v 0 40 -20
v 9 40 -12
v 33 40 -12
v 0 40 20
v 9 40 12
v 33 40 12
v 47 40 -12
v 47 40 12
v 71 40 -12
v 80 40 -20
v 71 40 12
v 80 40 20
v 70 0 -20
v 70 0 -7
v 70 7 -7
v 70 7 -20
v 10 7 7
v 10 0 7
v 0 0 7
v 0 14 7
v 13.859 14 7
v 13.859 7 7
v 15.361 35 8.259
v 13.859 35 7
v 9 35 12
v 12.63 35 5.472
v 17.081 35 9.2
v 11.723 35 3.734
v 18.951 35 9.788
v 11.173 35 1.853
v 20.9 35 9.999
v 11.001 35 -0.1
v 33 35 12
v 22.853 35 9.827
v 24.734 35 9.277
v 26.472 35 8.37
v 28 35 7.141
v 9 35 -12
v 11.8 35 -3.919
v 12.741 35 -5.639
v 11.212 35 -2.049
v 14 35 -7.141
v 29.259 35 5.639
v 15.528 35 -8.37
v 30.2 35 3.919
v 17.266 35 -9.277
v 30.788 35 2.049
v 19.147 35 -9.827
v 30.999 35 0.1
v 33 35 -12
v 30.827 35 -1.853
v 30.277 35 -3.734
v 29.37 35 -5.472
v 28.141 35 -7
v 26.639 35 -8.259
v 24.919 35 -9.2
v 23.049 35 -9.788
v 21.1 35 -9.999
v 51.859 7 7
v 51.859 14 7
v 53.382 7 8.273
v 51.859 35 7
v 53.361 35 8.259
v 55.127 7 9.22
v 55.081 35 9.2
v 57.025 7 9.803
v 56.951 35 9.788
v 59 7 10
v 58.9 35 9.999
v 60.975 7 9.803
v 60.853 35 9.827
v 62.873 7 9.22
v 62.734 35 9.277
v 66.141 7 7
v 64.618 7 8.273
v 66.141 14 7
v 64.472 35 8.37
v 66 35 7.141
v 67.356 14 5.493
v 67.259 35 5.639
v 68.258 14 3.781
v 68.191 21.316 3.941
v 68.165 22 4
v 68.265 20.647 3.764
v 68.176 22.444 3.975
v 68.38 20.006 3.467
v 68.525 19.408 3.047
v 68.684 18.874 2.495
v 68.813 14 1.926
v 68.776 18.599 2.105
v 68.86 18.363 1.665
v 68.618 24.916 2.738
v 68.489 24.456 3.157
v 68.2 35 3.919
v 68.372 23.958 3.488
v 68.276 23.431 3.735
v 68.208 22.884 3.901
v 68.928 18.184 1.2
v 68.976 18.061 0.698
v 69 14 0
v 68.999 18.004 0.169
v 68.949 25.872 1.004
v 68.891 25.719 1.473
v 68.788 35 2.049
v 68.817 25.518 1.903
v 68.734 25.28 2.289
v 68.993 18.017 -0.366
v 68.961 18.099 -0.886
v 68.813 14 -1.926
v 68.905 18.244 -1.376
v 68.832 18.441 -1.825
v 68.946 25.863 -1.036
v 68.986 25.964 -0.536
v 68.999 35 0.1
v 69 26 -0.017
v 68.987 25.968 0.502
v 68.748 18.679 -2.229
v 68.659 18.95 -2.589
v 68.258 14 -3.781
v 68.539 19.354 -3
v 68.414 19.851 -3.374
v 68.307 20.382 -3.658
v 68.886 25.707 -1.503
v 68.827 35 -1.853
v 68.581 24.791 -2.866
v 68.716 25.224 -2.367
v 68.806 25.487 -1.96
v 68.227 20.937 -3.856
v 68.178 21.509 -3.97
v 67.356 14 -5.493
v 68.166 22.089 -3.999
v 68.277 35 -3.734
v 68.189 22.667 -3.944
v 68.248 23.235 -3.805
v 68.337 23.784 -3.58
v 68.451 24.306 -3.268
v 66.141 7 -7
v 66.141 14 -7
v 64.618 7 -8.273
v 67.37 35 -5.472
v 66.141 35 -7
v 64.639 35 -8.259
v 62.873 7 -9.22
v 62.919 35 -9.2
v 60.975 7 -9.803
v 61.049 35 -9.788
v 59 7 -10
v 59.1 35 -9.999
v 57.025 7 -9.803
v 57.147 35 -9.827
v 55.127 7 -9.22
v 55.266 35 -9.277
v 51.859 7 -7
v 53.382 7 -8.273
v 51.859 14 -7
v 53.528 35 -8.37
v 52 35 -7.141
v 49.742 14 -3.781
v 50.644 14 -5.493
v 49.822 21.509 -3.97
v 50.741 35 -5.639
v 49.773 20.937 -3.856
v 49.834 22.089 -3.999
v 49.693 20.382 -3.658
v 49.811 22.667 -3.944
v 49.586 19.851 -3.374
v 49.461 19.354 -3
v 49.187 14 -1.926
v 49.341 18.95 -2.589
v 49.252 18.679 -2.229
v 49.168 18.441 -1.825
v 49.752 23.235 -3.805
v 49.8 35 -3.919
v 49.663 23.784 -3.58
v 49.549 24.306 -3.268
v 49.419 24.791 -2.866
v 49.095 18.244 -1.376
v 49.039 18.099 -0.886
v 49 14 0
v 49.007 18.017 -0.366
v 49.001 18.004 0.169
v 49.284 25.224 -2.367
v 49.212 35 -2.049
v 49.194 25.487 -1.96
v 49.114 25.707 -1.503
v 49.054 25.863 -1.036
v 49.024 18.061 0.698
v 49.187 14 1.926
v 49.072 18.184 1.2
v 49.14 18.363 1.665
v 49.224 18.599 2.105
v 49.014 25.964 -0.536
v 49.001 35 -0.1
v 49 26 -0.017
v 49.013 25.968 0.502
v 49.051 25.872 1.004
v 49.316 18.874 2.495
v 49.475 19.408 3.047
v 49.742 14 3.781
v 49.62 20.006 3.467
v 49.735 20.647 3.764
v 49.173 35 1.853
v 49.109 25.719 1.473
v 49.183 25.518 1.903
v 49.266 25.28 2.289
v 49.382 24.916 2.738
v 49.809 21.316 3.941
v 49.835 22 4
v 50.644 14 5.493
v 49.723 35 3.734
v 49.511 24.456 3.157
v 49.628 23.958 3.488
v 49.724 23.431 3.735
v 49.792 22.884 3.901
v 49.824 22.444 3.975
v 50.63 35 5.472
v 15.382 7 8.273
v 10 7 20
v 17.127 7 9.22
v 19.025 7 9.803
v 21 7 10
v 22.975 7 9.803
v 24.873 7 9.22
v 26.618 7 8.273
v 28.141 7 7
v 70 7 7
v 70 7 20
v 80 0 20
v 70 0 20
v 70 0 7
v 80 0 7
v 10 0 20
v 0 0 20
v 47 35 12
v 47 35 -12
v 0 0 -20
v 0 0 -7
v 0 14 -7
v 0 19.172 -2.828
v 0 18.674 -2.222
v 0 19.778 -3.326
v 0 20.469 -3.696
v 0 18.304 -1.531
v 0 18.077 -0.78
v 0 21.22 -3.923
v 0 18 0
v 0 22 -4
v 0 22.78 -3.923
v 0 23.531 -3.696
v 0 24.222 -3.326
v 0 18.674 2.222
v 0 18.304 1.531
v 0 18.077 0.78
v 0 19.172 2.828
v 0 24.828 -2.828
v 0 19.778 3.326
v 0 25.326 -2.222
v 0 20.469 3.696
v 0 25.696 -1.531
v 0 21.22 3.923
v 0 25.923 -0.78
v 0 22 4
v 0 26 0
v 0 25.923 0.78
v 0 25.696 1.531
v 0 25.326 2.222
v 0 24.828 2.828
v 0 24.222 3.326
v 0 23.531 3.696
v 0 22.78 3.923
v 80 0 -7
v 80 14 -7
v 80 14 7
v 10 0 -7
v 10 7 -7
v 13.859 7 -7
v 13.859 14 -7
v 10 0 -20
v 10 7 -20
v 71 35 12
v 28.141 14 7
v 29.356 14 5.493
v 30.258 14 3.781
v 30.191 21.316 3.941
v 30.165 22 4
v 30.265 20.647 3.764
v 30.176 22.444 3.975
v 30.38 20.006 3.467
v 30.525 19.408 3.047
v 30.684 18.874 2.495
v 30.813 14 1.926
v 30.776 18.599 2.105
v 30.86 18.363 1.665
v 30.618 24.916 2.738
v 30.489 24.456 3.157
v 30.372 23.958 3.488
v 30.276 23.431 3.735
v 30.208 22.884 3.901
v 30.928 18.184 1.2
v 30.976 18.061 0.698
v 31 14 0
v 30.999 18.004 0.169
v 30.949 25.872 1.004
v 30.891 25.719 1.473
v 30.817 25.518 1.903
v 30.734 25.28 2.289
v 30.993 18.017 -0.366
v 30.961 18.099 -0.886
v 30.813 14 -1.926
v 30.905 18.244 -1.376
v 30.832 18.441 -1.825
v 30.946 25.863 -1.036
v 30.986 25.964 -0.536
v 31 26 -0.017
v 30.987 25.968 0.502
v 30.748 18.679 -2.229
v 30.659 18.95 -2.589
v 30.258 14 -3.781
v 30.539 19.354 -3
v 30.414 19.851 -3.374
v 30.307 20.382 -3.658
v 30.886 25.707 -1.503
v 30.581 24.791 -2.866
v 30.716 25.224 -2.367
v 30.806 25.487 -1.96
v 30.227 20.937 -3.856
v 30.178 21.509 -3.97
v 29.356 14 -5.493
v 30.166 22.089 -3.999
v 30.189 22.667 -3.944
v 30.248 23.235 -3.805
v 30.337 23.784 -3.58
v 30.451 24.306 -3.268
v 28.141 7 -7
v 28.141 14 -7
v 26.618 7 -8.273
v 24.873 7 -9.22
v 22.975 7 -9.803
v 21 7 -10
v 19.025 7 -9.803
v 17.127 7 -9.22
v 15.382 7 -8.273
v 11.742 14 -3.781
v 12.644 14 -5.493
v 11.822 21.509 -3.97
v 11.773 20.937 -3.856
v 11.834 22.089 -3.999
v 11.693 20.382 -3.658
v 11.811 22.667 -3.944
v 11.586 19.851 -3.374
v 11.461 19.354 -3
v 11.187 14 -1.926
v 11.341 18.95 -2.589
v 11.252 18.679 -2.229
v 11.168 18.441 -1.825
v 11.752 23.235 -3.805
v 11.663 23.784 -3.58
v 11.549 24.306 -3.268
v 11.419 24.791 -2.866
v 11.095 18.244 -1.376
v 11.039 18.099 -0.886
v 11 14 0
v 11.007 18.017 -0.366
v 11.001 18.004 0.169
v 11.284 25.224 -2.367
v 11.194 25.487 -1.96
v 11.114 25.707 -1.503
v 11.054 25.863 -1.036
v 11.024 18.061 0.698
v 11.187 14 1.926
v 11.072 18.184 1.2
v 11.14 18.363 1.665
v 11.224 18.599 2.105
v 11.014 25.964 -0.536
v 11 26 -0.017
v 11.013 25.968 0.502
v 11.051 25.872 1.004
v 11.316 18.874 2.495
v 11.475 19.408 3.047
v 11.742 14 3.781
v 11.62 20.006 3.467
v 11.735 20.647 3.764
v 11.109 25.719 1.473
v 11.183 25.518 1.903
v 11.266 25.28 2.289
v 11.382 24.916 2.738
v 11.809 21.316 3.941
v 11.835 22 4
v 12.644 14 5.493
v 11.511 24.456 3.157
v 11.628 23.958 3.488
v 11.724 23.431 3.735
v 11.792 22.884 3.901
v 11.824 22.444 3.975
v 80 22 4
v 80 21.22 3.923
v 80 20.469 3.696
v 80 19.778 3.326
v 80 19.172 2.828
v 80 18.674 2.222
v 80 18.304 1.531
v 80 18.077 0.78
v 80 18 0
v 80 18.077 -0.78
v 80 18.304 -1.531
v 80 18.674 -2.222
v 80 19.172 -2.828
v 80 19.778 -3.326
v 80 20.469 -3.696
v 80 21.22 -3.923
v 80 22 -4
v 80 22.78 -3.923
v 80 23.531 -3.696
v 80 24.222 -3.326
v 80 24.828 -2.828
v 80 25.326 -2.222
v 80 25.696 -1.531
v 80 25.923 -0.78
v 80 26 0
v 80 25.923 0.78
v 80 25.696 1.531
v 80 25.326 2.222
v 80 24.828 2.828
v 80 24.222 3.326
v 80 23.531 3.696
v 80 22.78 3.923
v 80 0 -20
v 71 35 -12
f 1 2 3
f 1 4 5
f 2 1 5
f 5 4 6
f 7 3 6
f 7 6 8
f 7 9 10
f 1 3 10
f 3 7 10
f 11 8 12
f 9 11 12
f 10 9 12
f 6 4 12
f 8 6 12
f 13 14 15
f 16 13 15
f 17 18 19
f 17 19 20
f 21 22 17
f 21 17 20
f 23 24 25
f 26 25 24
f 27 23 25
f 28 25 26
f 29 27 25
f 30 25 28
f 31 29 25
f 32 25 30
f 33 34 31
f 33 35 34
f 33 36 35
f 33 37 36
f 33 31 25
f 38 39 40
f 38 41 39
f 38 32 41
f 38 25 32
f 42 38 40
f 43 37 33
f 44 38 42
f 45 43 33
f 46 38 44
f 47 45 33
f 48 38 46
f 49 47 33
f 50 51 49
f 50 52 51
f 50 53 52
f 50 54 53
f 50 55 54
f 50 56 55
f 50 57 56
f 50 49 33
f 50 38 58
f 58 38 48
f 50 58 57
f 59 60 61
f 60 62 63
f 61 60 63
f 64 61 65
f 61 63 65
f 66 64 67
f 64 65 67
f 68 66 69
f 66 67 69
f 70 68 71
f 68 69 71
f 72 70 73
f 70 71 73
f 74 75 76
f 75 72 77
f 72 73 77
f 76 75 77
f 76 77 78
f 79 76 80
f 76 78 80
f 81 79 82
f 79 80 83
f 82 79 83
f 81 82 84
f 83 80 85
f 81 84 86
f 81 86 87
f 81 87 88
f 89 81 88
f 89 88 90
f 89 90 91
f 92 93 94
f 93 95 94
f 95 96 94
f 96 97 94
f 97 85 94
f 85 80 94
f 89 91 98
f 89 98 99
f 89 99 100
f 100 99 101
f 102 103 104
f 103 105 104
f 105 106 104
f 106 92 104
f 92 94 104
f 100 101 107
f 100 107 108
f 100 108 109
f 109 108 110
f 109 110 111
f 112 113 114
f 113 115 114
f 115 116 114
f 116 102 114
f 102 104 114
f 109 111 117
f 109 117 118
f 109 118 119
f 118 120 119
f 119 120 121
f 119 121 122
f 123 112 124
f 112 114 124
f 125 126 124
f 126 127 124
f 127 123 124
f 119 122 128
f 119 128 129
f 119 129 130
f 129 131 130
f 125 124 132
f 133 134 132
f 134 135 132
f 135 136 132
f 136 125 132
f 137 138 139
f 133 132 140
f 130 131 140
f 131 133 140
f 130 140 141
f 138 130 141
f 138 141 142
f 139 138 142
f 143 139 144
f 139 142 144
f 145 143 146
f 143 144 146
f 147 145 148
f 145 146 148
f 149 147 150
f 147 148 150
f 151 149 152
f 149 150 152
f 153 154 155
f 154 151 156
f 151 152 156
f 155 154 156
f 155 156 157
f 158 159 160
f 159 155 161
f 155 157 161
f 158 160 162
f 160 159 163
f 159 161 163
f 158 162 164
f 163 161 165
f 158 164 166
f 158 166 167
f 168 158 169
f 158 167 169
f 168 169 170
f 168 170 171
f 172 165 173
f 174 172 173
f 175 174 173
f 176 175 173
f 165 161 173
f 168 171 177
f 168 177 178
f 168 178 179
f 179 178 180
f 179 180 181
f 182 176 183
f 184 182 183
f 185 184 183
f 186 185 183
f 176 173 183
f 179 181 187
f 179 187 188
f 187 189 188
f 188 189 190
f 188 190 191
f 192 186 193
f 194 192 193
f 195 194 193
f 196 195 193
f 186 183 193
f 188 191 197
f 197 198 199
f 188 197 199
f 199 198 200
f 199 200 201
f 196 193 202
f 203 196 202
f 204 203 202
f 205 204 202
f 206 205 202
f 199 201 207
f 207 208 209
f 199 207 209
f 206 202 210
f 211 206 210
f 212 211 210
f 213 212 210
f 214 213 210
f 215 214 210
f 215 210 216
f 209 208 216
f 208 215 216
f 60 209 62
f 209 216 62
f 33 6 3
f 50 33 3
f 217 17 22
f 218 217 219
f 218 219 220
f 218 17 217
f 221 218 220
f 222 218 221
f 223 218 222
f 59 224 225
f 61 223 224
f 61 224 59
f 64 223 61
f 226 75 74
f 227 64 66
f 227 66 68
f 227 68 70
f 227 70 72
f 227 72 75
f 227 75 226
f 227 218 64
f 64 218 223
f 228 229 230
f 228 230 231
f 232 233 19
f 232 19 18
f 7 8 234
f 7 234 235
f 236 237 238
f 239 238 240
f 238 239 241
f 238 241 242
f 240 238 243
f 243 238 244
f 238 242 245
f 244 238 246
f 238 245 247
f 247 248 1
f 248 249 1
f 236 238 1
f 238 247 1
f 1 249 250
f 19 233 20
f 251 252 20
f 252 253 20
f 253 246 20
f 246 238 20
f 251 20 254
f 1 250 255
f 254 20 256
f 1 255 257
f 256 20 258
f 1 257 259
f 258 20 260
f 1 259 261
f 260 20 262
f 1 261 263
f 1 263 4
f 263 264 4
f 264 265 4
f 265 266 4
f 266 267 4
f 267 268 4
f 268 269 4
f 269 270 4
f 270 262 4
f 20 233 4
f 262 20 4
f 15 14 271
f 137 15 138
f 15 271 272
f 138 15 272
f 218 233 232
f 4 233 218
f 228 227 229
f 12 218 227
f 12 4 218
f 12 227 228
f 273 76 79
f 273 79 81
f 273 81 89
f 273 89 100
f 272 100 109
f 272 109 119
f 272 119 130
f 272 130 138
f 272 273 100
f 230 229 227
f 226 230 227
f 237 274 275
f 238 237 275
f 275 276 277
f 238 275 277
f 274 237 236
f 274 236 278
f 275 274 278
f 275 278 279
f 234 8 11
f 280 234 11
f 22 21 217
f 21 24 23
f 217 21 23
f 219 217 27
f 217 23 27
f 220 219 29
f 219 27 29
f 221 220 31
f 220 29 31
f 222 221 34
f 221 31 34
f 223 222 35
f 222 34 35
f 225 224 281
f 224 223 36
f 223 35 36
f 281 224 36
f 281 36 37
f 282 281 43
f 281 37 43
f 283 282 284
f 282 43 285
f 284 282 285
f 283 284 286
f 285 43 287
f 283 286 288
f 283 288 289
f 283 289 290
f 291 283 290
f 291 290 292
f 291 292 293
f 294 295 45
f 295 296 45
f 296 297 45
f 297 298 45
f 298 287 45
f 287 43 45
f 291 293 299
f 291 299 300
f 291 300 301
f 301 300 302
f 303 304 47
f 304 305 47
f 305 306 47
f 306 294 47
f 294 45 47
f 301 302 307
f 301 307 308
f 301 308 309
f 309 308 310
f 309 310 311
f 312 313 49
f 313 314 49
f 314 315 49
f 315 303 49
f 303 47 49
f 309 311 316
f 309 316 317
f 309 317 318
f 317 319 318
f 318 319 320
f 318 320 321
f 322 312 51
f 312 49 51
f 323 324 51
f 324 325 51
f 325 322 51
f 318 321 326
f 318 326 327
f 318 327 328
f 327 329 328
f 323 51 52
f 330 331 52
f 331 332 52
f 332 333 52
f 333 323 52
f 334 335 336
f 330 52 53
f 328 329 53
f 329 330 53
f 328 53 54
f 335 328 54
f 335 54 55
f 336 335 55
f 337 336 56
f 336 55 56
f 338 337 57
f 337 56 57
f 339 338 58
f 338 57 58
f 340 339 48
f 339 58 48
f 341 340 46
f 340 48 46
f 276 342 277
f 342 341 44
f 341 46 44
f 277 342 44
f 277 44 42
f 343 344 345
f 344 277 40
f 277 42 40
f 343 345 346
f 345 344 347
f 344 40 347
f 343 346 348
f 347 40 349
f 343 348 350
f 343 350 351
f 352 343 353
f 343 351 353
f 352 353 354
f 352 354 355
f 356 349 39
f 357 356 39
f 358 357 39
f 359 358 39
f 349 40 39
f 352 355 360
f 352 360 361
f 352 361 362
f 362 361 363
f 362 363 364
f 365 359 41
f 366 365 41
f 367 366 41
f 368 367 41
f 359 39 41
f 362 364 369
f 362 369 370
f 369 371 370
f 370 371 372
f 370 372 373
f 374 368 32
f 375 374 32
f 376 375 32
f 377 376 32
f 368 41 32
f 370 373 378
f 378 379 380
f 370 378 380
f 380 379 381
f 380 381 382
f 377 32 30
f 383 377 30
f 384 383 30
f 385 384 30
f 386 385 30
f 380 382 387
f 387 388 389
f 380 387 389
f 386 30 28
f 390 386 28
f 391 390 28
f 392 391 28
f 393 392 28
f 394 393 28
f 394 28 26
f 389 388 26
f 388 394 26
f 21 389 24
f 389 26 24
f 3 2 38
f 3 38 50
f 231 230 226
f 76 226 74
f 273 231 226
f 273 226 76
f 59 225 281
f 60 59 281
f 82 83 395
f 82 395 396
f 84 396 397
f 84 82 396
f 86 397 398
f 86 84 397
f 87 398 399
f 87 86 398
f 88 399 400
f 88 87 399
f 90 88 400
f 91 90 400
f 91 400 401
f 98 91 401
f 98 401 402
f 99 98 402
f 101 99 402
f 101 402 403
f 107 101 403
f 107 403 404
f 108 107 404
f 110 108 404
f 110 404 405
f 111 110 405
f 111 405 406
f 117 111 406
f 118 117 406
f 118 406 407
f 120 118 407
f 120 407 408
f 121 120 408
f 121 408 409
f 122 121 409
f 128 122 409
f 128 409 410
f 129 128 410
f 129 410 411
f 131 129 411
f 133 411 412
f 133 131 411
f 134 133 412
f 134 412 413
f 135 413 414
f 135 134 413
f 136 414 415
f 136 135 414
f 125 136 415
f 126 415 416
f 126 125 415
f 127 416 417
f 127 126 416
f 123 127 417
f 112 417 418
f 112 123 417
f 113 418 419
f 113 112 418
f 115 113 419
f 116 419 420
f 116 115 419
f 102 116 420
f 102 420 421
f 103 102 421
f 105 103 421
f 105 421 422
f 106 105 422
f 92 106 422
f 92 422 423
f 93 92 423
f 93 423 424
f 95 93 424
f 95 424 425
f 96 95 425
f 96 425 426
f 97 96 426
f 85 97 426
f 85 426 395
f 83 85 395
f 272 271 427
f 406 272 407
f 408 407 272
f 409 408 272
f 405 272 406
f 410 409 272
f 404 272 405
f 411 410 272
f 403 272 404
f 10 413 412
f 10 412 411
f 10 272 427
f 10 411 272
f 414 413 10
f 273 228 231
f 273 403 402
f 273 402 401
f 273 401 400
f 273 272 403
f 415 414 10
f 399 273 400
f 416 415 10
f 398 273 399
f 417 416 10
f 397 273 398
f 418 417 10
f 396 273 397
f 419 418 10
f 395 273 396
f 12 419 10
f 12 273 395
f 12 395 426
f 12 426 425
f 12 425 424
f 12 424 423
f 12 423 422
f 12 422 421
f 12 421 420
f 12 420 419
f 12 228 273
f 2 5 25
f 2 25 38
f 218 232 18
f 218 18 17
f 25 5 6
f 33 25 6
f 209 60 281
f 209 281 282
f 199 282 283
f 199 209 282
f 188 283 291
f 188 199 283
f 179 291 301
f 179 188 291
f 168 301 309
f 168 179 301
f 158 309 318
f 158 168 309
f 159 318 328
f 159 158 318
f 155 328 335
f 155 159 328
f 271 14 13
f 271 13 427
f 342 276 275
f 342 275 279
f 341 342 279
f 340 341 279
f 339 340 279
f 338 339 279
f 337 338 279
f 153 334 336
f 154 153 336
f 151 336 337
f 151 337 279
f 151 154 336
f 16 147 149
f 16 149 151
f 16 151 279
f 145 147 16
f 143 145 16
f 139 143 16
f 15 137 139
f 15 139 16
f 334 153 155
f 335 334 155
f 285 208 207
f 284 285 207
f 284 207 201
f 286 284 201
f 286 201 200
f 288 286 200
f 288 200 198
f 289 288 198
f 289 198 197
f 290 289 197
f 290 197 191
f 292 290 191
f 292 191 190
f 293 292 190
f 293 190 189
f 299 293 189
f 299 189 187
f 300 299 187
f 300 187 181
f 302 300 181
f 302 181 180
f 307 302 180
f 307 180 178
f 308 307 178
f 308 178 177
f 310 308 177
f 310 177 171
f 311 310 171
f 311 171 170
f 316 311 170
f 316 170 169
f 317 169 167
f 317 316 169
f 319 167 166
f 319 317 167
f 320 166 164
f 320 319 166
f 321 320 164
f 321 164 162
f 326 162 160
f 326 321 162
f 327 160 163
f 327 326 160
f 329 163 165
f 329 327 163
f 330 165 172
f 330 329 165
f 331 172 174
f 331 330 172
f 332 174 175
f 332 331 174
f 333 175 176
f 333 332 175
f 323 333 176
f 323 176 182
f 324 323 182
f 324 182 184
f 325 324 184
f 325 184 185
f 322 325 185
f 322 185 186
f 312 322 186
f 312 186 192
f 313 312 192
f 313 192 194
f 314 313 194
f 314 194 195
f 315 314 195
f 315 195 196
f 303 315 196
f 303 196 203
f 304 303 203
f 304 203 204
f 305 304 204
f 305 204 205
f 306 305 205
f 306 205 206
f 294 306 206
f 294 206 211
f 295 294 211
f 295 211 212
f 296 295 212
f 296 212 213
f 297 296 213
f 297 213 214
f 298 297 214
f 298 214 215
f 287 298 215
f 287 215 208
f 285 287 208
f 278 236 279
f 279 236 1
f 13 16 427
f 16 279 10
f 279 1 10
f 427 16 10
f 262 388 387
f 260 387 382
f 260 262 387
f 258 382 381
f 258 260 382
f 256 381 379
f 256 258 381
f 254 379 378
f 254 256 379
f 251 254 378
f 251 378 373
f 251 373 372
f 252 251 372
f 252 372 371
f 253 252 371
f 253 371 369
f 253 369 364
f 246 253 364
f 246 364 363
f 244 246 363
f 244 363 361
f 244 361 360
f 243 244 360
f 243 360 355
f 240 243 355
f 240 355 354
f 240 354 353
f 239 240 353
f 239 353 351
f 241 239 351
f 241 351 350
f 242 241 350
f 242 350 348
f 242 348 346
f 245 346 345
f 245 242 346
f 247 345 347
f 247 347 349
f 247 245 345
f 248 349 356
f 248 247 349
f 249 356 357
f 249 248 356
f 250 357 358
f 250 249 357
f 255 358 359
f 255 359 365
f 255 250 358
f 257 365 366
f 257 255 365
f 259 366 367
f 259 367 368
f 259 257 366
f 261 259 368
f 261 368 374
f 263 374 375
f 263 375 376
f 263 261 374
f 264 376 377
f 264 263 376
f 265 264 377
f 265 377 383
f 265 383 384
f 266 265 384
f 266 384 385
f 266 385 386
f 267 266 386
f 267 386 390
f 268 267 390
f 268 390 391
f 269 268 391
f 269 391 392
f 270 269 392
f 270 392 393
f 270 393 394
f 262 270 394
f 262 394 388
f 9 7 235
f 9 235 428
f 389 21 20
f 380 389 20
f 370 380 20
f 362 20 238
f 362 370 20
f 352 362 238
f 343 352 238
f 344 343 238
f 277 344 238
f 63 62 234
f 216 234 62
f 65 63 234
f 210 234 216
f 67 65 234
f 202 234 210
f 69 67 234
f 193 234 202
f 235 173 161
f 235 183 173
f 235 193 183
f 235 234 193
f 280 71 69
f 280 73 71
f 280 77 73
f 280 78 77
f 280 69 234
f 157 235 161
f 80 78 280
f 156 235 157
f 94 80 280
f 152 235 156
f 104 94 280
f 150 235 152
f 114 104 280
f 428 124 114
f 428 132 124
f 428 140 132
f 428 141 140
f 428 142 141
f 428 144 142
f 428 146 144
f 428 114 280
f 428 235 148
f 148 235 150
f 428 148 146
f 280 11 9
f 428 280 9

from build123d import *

# Parameters (mm, degrees)
SKETCH1_W               = 80
SKETCH1_H               = 40
BOSS_EXTRUDE1_DEPTH     = 20
SKETCH2_W               = 60
SKETCH2_H               = 7
CUT_EXTRUDE1_DEPTH      = 40
SKETCH3_W               = 14
SKETCH3_H               = 14
CUT_EXTRUDE2_DEPTH      = 80
CUT_EXTRUDE3_DEPTH      = 92.651513899
CUT_EXTRUDE3_DEPTH_BACK = 80
SKETCH4_R               = 4
SKETCH5_W               = 24
SKETCH5_H               = 24
CUT_EXTRUDE4_DEPTH      = 5
SKETCH6_R               = 10
CUT_EXTRUDE6_DEPTH      = 92.651513899


with BuildPart() as part:
    # Sketch1 → Boss-Extrude1 (new, symmetric)
    with BuildSketch(Plane.XY):
        with Locations((40, 20)):
            Rectangle(SKETCH1_W, SKETCH1_H)
    extrude(amount=BOSS_EXTRUDE1_DEPTH, both=True)

    # Sketch2 → Cut-Extrude1 (cut)
    with BuildSketch(Plane.XY.offset(20)):
        with Locations((40, 3.5)):
            Rectangle(SKETCH2_W, SKETCH2_H)
    extrude(amount=-CUT_EXTRUDE1_DEPTH, mode=Mode.SUBTRACT)

    # Sketch3 → Cut-Extrude2 (cut)
    with BuildSketch(Plane(origin=(80, 0, 0), x_dir=(0, 0, -1), z_dir=(1, 0, 0))):
        with Locations((0, 7)):
            Rectangle(SKETCH3_W, SKETCH3_H)
    extrude(amount=-CUT_EXTRUDE2_DEPTH, mode=Mode.SUBTRACT)

    # Sketch4 → Cut-Extrude3 (cut, two sides: drawn at the far end of the back side and taken through both)
    with BuildSketch(Plane(origin=(80, 0, 0), x_dir=(0, 0, -1), z_dir=(1, 0, 0)).offset(-CUT_EXTRUDE3_DEPTH_BACK)):
        with Locations(Location((0, 22, 0), (0, 0, 180))):
            Circle(SKETCH4_R)
    extrude(amount=CUT_EXTRUDE3_DEPTH + CUT_EXTRUDE3_DEPTH_BACK, mode=Mode.SUBTRACT)

    # Sketch5 → Cut-Extrude4 (cut)
    with BuildSketch(Plane(origin=(0, 40, 0), x_dir=(1, 0, 0), z_dir=(0, 1, 0))):
        with Locations((59, 0)):
            Rectangle(SKETCH5_W, SKETCH5_H)
        with Locations((21, 0)):
            Rectangle(SKETCH5_W, SKETCH5_H)
    extrude(amount=-CUT_EXTRUDE4_DEPTH, mode=Mode.SUBTRACT)

    # Sketch6 → Cut-Extrude6 (cut, through all)
    with BuildSketch(Plane(origin=(0, 40, 0), x_dir=(1, 0, 0), z_dir=(0, 1, 0))):
        with Locations(Location((59, 0, 0), (0, 0, 224.427004001))):
            Circle(SKETCH6_R)
        with Locations(Location((21, 0, 0), (0, 0, 224.427004001))):
            Circle(SKETCH6_R)
    extrude(amount=-CUT_EXTRUDE6_DEPTH, mode=Mode.SUBTRACT)


solid = part.part
